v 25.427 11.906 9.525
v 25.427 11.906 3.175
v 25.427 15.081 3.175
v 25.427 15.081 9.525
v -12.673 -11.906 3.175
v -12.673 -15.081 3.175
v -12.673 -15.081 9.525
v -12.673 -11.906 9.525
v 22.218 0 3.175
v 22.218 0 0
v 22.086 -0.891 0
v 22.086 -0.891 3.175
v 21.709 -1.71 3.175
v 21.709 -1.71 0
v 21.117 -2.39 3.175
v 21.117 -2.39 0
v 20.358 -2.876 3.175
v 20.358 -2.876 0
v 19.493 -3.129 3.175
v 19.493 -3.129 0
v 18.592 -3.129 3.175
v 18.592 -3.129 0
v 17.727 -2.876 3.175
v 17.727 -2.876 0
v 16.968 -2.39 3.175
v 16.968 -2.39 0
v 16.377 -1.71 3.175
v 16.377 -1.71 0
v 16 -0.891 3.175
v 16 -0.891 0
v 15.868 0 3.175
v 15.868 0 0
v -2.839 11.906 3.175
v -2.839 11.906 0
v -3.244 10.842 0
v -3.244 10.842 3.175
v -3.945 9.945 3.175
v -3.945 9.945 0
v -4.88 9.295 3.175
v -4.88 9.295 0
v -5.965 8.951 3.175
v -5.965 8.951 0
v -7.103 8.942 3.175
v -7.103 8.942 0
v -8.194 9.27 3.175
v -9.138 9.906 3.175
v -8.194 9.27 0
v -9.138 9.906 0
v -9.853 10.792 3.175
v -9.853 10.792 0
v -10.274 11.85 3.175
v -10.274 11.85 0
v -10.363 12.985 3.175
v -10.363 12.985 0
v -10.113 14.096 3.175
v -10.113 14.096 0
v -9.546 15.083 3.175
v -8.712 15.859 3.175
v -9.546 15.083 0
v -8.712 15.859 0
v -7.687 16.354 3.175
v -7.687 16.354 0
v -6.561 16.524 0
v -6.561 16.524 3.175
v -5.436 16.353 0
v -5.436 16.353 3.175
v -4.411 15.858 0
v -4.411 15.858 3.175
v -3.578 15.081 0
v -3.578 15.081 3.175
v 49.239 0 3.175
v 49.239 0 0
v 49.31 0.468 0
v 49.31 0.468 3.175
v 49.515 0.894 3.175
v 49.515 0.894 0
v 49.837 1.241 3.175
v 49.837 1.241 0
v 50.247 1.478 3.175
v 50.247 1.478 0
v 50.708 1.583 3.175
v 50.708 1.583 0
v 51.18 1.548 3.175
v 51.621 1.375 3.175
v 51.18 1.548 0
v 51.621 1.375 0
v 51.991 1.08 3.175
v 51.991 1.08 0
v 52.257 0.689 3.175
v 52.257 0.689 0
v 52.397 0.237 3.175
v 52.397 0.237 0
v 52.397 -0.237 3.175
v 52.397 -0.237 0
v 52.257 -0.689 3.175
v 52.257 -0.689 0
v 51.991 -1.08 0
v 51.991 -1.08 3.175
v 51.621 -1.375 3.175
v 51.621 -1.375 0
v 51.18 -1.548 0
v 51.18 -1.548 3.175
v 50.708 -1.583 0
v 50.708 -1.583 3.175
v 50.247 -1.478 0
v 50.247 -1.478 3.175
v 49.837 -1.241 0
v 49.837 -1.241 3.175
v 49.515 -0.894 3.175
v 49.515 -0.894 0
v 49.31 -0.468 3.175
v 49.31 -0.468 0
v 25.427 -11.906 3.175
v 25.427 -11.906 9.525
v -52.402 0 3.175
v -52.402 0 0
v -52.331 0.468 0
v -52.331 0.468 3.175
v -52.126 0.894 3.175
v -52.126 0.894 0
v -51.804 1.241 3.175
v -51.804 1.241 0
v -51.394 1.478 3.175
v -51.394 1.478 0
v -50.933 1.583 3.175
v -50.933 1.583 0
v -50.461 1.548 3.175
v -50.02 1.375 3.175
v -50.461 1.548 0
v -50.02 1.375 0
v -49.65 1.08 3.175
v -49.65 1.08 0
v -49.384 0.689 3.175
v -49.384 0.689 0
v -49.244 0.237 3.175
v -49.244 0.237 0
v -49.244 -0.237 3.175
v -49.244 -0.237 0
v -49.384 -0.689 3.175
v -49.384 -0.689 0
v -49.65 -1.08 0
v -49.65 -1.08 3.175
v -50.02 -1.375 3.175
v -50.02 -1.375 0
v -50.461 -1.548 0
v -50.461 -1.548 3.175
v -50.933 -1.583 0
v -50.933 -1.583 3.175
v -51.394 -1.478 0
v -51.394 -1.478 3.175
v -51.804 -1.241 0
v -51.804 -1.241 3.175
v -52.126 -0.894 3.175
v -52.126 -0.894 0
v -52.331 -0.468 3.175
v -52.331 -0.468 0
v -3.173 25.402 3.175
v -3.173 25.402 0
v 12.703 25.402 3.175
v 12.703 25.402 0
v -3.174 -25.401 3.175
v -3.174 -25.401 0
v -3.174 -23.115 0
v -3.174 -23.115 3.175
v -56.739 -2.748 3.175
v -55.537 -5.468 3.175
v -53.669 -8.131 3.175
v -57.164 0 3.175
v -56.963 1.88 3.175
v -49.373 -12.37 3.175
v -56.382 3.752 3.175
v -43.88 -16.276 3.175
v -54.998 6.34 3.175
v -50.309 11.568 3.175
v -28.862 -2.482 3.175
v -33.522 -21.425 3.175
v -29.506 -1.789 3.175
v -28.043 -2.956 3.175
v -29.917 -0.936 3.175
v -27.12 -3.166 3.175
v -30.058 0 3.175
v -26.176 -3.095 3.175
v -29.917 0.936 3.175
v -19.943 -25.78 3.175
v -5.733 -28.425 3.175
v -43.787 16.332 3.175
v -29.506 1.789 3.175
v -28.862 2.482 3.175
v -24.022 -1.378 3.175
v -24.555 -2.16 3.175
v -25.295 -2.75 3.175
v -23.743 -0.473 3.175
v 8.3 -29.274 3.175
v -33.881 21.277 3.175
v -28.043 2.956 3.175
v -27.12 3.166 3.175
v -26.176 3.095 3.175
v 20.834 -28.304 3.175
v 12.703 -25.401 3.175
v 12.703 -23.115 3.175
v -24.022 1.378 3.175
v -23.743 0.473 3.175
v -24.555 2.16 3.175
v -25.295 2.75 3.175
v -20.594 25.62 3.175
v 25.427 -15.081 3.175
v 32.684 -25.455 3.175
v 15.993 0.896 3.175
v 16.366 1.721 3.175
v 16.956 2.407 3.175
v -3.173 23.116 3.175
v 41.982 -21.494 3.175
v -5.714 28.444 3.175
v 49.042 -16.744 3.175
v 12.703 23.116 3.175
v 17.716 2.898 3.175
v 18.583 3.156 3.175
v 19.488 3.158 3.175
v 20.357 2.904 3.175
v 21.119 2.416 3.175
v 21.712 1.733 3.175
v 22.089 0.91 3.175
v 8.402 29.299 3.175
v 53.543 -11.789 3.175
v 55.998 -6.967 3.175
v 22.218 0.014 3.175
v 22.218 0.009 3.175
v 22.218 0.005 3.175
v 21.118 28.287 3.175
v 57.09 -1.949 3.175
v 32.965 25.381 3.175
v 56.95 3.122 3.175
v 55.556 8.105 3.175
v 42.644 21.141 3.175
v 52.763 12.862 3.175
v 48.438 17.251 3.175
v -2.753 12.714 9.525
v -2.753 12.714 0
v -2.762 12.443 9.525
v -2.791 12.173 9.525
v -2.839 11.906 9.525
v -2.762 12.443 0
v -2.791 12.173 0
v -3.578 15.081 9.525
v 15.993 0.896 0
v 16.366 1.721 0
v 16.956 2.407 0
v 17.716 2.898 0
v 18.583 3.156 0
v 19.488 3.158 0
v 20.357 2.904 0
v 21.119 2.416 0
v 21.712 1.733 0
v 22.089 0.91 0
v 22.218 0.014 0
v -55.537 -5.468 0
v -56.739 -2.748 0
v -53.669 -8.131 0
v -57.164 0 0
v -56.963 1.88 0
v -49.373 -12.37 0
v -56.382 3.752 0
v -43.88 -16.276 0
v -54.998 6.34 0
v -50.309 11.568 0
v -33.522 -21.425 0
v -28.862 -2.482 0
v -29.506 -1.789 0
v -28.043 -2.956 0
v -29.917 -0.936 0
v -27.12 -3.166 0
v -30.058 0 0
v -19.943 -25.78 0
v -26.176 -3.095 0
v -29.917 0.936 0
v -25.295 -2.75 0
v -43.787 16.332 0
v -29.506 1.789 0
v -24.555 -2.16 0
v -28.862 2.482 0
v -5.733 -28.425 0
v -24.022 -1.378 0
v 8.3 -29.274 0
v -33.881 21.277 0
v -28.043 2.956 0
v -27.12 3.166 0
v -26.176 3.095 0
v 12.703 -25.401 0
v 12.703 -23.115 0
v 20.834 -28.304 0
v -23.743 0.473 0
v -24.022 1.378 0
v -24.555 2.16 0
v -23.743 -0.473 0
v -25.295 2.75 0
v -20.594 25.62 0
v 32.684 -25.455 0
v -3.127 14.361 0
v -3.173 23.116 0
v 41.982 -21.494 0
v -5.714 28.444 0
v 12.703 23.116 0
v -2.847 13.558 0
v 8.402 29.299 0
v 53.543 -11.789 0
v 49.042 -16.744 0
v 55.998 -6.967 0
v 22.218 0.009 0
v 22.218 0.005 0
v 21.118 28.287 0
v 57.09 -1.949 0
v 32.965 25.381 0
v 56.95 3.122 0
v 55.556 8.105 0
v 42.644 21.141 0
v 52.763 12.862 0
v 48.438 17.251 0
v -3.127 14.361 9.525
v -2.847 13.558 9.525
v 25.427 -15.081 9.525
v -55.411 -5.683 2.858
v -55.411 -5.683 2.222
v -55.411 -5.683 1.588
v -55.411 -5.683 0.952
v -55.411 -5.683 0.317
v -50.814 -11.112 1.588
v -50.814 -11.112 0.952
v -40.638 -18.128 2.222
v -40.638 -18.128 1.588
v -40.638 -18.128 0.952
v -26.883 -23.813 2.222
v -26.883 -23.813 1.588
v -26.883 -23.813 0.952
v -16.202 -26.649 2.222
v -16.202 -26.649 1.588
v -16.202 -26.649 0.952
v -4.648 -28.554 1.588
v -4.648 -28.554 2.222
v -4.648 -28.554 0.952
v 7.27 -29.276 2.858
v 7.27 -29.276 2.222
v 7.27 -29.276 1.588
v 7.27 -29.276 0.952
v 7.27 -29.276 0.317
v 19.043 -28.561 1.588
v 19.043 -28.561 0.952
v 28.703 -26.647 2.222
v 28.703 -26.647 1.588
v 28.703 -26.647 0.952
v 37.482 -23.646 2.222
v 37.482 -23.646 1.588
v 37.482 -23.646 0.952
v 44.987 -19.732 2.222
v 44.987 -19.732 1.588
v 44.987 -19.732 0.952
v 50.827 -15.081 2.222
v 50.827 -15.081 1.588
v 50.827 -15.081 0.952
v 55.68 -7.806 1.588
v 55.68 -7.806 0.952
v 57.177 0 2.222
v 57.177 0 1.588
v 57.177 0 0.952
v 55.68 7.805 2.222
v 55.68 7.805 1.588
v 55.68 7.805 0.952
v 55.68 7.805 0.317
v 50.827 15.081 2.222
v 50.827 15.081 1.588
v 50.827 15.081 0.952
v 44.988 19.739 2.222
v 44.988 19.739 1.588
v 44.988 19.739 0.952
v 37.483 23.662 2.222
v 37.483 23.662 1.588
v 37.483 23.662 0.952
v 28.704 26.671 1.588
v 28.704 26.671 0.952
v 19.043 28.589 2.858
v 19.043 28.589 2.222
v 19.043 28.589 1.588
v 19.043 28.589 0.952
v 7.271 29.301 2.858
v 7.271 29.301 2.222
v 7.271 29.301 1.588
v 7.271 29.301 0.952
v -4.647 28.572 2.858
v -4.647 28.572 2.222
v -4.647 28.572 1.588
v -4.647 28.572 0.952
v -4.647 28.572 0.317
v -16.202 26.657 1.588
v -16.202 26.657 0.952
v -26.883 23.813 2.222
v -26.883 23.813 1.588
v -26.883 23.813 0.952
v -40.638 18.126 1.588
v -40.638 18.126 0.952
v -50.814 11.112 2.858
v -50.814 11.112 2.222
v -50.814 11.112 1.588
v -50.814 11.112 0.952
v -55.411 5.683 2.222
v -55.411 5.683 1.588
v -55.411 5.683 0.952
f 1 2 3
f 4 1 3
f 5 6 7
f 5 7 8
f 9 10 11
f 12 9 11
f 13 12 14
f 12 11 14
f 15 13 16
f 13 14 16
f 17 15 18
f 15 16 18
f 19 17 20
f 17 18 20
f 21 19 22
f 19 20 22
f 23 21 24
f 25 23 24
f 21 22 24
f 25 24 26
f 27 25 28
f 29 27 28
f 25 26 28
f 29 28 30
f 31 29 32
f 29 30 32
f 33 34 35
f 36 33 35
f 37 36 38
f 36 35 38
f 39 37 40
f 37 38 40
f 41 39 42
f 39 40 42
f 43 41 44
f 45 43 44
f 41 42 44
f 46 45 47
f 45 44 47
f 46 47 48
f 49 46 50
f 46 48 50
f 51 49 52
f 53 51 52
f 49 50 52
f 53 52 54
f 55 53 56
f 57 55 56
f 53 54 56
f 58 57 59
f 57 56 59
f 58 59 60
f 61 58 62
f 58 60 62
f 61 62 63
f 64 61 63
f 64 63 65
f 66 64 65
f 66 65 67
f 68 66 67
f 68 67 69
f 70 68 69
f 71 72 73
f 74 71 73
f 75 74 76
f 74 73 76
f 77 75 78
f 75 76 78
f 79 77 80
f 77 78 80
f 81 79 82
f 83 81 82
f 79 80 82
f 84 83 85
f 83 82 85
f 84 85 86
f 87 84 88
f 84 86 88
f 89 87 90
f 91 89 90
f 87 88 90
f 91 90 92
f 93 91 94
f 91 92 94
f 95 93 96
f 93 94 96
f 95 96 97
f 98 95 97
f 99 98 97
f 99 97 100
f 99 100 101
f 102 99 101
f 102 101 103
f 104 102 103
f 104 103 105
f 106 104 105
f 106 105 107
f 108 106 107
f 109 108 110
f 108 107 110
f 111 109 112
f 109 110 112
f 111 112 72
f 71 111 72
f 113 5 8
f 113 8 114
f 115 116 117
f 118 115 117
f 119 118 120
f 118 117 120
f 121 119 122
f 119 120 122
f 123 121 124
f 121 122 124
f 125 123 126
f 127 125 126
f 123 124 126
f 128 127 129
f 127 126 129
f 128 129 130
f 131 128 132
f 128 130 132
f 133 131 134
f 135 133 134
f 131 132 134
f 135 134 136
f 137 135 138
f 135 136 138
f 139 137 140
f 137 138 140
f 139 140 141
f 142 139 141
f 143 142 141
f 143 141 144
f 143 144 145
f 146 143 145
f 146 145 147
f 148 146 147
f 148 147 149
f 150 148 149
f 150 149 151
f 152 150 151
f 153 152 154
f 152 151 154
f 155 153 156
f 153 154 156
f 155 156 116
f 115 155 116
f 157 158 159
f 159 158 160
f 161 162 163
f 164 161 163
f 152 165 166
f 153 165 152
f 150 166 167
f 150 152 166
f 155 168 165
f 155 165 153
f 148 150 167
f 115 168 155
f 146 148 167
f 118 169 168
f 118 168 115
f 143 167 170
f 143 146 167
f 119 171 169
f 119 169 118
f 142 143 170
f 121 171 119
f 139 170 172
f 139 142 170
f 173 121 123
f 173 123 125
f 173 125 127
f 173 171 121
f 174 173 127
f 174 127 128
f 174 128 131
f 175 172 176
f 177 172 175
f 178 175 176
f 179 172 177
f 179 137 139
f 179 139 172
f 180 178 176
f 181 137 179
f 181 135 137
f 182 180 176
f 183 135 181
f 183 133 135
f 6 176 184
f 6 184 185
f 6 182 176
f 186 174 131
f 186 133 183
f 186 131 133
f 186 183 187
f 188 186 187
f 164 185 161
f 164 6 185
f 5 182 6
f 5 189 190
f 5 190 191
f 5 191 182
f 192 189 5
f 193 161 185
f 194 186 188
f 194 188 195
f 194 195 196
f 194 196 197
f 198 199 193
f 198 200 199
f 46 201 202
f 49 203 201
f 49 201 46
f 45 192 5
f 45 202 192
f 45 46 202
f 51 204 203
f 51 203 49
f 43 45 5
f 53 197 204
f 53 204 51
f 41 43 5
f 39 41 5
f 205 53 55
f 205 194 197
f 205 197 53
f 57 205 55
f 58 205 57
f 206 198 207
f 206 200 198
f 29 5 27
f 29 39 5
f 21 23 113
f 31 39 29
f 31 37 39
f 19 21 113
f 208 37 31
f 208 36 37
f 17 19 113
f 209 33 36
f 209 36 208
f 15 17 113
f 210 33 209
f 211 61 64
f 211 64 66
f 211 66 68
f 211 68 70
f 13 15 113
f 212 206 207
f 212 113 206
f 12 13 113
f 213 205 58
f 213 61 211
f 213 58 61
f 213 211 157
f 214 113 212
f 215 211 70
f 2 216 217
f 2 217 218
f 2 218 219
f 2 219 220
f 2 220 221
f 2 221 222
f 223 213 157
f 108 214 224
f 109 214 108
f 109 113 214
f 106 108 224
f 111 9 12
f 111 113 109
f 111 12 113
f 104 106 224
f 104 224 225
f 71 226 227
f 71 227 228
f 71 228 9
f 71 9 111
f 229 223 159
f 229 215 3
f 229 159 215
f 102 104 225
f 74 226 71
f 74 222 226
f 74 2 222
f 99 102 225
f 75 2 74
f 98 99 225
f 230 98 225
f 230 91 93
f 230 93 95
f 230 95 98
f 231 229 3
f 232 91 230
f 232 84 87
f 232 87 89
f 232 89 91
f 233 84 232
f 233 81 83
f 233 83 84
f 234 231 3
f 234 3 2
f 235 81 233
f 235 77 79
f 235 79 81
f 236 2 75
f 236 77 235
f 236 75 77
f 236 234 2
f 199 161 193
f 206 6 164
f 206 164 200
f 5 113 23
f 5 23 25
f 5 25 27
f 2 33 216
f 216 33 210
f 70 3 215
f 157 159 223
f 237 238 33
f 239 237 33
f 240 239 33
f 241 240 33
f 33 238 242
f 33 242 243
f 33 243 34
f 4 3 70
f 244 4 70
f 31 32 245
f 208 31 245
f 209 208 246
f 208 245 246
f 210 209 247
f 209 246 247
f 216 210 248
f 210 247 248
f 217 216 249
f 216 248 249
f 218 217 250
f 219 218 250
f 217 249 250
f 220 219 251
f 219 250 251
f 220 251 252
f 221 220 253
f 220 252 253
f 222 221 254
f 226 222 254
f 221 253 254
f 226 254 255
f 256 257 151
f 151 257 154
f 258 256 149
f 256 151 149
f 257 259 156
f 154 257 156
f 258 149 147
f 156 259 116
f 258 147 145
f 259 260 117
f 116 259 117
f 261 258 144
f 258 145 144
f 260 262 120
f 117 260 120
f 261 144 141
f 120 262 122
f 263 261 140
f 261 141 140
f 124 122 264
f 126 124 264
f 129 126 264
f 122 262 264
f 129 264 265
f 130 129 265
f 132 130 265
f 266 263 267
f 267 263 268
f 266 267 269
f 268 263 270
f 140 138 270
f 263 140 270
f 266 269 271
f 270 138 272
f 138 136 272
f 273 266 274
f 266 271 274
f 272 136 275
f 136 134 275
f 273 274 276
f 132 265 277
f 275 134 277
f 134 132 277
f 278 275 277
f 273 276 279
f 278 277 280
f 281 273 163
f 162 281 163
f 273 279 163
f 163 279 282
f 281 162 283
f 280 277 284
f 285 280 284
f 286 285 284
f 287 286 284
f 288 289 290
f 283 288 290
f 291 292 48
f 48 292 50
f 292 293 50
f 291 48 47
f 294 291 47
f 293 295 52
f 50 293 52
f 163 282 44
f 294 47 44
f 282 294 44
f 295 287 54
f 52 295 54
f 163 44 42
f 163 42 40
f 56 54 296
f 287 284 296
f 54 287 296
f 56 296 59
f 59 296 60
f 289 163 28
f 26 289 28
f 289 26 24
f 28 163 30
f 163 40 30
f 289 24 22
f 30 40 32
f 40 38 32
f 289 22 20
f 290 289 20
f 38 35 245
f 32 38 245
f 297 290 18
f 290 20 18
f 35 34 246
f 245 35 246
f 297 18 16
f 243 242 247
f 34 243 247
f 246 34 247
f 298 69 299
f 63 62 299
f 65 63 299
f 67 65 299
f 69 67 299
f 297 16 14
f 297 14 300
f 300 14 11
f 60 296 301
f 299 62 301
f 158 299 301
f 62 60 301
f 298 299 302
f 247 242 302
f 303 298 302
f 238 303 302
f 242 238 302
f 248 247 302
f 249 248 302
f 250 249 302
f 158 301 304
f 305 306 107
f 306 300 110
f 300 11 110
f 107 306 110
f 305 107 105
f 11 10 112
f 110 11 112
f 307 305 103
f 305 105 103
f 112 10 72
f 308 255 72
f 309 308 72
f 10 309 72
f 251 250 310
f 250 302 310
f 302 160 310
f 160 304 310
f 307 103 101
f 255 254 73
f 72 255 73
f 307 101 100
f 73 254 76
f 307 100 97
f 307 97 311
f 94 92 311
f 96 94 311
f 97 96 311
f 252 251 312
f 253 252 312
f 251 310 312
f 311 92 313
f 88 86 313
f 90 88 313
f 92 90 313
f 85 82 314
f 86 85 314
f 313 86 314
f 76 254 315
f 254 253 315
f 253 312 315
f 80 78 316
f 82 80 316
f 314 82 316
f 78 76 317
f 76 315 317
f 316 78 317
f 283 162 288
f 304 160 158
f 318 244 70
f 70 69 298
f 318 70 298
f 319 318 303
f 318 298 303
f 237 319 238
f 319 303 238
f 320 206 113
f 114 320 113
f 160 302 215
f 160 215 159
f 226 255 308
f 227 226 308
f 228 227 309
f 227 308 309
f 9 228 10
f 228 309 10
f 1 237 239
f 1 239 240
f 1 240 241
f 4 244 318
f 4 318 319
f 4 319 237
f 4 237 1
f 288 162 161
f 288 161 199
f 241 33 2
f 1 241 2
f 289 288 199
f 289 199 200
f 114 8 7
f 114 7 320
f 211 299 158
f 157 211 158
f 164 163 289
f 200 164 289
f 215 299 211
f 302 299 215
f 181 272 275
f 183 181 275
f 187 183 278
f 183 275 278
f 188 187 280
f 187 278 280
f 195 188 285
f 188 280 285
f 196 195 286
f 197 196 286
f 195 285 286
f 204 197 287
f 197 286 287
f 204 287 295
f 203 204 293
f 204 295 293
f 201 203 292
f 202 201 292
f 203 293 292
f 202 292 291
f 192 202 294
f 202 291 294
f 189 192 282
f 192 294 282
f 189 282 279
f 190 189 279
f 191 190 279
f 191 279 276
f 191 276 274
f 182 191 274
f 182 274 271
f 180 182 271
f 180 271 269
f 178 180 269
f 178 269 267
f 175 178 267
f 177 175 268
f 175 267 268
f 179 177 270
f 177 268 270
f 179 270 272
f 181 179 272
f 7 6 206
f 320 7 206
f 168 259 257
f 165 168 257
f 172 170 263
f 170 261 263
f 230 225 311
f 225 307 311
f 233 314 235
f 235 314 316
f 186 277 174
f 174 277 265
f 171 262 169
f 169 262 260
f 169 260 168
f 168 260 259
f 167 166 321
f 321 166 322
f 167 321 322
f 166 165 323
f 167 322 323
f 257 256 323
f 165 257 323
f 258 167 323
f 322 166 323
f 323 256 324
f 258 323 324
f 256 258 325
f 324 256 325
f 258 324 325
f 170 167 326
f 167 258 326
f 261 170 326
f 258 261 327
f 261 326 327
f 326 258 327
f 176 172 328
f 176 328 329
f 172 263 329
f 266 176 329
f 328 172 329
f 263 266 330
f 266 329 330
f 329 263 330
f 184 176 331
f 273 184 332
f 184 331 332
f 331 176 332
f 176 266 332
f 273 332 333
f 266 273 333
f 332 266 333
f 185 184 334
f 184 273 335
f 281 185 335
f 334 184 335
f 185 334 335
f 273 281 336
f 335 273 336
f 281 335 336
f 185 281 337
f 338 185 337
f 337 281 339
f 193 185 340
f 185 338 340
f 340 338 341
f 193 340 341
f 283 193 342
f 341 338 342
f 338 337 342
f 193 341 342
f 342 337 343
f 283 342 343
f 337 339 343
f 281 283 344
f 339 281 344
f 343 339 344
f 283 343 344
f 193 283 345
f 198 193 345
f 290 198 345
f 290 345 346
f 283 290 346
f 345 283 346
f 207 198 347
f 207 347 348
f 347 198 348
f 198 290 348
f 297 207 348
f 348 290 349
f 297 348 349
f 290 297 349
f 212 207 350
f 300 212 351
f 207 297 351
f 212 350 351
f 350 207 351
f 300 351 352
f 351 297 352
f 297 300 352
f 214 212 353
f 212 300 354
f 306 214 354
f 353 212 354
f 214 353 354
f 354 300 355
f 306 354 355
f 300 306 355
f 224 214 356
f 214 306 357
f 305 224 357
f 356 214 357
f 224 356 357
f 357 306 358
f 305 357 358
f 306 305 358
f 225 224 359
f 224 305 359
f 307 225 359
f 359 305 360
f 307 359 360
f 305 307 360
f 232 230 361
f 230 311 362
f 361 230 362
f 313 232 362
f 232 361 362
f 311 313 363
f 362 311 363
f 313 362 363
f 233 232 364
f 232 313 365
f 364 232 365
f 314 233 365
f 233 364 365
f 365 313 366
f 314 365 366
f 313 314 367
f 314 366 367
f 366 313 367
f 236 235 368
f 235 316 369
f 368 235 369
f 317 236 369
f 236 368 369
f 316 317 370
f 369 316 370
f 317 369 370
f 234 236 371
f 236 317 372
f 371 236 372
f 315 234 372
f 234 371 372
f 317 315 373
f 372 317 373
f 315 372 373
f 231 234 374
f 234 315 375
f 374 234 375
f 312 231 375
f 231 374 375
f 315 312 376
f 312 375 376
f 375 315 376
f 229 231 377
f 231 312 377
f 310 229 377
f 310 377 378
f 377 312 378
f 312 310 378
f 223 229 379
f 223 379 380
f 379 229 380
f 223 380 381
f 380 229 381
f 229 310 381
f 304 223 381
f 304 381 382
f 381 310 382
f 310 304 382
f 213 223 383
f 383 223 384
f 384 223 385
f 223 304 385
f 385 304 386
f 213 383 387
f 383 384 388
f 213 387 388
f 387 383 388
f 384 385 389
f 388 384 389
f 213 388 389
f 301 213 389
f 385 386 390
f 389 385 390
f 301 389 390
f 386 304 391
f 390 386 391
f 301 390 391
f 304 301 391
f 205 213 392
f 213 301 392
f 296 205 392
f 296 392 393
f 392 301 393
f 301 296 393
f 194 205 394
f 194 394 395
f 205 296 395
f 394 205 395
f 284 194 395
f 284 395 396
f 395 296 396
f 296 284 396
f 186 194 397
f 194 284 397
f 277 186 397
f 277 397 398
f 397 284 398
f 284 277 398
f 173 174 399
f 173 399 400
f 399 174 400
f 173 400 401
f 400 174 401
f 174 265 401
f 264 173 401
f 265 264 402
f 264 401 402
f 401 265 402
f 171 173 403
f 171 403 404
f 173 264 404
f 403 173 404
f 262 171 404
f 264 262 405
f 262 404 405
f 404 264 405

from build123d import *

# Parameters (mm, degrees)
F0_W     = 15.876858935
F0_H     = 2.286
F0_W_2   = 38.1000000002
F0_H_2   = 3.175
F0_W_3   = 15.8758046778
F1_DEPTH = 3.175
F2_DEPTH = 9.525


with BuildPart() as f1:
    # F0 (on Top) → F1 (new body)
    with BuildSketch(Plane.XY):
        with BuildLine():
            Line((15.8677943845, 0), (-23.7076027334, 0))
            ThreePointArc((-23.7076027334, 0), (-26.8826027334, -3.175), (-30.0576027334, 0))
            Line((-30.0576027334, 0), (-49.2266940624, 0))
            ThreePointArc((-49.2266940624, 0), (-50.8141940624, -1.5875), (-52.4016940624, 0))
            Line((-52.4016940624, 0), (-57.1641940624, 0))
            add(Edge.make_bspline(
                [(57.1768239528, 0), (57.1770156094, -5.2627414961), (52.5796635598, -18.1740612651), (18.4726643687, -32.7278489429), (-26.5642703947, -26.2041477461), (-50.8830626651, -13.1851822393), (-57.1641936658, -3.8166041807), (-57.1641940624, 0)],
                knots=[0.5000113186, 0.5000113186, 0.5000113186, 0.5000113186, 0.5793319877, 0.6945471525, 0.8277851465, 0.929849225, 1, 1, 1, 1], degree=3))
            Line((57.1768239528, 0), (52.4143239528, 0))
            ThreePointArc((52.4143239528, 0), (50.8268239528, -1.5875), (49.2393239528, 0))
            Line((49.2393239528, 0), (22.2177314709, 0))
            ThreePointArc((22.2177314709, 0), (19.0427629277, -3.1608667109), (15.8677943845, 0))
        make_face()
        with Locations((4.7642341302, -24.2581772995)):
            Rectangle(F0_W, F0_H, mode=Mode.SUBTRACT)
        with Locations((6.3768239537, -13.493750001)):
            Rectangle(F0_W_2, F0_H_2, mode=Mode.SUBTRACT)
        with BuildLine():
            ThreePointArc((-30.0576027334, 0), (-26.8826027334, 3.175), (-23.7076027334, 0))
            Line((-23.7076027334, 0), (15.8677943845, 0))
            ThreePointArc((15.8677943845, 0), (19.0356962657, 3.1891254249), (22.2177629277, 0.0141332891))
            ThreePointArc((22.2177629277, 0.0141332891), (22.2177550635, 0.007066627), (22.2177314709, 0))
            Line((22.2177314709, 0), (49.2393239528, 0))
            ThreePointArc((49.2393239528, 0), (50.8268239528, 1.5875), (52.4143239528, 0))
            Line((52.4143239528, 0), (57.1768239528, 0))
            add(Edge.make_bspline(
                [(-57.1641940624, 0), (-57.1641944589, 3.8166041807), (-50.883065405, 13.1869760393), (-26.5639162211, 26.1936810476), (18.4761240651, 32.7776202088), (52.5779045209, 18.1666423493), (57.1766322962, 5.2627414961), (57.1768239528, 0)],
                knots=[0, 0, 0, 0, 0.070150775, 0.1722148535, 0.3054570544, 0.4206906495, 0.5000113186, 0.5000113186, 0.5000113186, 0.5000113186], degree=3))
            Line((-57.1641940624, 0), (-52.4016940624, 0))
            ThreePointArc((-52.4016940624, 0), (-50.8141940624, 1.5875), (-49.2266940624, 0))
            Line((-49.2266940624, 0), (-30.0576027334, 0))
        make_face()
        with BuildLine():
            ThreePointArc((-2.8391045245, 11.906250005), (-10.2735261014, 11.8502858718), (-3.5776596946, 15.081250005))
            Line((-3.5776596946, 15.081250005), (25.4268239538, 15.081250005))
            Line((25.4268239538, 15.081250005), (25.4268239538, 11.906250005))
            Line((25.4268239538, 11.906250005), (-2.8391045245, 11.906250005))
        make_face(mode=Mode.SUBTRACT)
        with Locations((4.7647612588, 24.2588748922)):
            Rectangle(F0_W_3, F0_H, mode=Mode.SUBTRACT)
    extrude(amount=F1_DEPTH)

    # F0 (on Top) → F2 (join)
    with BuildSketch(Plane.XY):
        with BuildLine():
            ThreePointArc((-3.5776596946, 15.081250005), (-2.9647747096, 13.9671932499), (-2.7526027334, 12.7135052858))
            ThreePointArc((-2.7526027334, 12.7135052858), (-2.7742899047, 12.3075669752), (-2.8391045245, 11.906250005))
            Line((-2.8391045245, 11.906250005), (25.4268239538, 11.906250005))
            Line((25.4268239538, 11.906250005), (25.4268239538, 15.081250005))
            Line((25.4268239538, 15.081250005), (-3.5776596946, 15.081250005))
        make_face()
        with Locations((6.3768239537, -13.493750001)):
            Rectangle(F0_W_2, F0_H_2)
    extrude(amount=F2_DEPTH)


solid = f1.part
